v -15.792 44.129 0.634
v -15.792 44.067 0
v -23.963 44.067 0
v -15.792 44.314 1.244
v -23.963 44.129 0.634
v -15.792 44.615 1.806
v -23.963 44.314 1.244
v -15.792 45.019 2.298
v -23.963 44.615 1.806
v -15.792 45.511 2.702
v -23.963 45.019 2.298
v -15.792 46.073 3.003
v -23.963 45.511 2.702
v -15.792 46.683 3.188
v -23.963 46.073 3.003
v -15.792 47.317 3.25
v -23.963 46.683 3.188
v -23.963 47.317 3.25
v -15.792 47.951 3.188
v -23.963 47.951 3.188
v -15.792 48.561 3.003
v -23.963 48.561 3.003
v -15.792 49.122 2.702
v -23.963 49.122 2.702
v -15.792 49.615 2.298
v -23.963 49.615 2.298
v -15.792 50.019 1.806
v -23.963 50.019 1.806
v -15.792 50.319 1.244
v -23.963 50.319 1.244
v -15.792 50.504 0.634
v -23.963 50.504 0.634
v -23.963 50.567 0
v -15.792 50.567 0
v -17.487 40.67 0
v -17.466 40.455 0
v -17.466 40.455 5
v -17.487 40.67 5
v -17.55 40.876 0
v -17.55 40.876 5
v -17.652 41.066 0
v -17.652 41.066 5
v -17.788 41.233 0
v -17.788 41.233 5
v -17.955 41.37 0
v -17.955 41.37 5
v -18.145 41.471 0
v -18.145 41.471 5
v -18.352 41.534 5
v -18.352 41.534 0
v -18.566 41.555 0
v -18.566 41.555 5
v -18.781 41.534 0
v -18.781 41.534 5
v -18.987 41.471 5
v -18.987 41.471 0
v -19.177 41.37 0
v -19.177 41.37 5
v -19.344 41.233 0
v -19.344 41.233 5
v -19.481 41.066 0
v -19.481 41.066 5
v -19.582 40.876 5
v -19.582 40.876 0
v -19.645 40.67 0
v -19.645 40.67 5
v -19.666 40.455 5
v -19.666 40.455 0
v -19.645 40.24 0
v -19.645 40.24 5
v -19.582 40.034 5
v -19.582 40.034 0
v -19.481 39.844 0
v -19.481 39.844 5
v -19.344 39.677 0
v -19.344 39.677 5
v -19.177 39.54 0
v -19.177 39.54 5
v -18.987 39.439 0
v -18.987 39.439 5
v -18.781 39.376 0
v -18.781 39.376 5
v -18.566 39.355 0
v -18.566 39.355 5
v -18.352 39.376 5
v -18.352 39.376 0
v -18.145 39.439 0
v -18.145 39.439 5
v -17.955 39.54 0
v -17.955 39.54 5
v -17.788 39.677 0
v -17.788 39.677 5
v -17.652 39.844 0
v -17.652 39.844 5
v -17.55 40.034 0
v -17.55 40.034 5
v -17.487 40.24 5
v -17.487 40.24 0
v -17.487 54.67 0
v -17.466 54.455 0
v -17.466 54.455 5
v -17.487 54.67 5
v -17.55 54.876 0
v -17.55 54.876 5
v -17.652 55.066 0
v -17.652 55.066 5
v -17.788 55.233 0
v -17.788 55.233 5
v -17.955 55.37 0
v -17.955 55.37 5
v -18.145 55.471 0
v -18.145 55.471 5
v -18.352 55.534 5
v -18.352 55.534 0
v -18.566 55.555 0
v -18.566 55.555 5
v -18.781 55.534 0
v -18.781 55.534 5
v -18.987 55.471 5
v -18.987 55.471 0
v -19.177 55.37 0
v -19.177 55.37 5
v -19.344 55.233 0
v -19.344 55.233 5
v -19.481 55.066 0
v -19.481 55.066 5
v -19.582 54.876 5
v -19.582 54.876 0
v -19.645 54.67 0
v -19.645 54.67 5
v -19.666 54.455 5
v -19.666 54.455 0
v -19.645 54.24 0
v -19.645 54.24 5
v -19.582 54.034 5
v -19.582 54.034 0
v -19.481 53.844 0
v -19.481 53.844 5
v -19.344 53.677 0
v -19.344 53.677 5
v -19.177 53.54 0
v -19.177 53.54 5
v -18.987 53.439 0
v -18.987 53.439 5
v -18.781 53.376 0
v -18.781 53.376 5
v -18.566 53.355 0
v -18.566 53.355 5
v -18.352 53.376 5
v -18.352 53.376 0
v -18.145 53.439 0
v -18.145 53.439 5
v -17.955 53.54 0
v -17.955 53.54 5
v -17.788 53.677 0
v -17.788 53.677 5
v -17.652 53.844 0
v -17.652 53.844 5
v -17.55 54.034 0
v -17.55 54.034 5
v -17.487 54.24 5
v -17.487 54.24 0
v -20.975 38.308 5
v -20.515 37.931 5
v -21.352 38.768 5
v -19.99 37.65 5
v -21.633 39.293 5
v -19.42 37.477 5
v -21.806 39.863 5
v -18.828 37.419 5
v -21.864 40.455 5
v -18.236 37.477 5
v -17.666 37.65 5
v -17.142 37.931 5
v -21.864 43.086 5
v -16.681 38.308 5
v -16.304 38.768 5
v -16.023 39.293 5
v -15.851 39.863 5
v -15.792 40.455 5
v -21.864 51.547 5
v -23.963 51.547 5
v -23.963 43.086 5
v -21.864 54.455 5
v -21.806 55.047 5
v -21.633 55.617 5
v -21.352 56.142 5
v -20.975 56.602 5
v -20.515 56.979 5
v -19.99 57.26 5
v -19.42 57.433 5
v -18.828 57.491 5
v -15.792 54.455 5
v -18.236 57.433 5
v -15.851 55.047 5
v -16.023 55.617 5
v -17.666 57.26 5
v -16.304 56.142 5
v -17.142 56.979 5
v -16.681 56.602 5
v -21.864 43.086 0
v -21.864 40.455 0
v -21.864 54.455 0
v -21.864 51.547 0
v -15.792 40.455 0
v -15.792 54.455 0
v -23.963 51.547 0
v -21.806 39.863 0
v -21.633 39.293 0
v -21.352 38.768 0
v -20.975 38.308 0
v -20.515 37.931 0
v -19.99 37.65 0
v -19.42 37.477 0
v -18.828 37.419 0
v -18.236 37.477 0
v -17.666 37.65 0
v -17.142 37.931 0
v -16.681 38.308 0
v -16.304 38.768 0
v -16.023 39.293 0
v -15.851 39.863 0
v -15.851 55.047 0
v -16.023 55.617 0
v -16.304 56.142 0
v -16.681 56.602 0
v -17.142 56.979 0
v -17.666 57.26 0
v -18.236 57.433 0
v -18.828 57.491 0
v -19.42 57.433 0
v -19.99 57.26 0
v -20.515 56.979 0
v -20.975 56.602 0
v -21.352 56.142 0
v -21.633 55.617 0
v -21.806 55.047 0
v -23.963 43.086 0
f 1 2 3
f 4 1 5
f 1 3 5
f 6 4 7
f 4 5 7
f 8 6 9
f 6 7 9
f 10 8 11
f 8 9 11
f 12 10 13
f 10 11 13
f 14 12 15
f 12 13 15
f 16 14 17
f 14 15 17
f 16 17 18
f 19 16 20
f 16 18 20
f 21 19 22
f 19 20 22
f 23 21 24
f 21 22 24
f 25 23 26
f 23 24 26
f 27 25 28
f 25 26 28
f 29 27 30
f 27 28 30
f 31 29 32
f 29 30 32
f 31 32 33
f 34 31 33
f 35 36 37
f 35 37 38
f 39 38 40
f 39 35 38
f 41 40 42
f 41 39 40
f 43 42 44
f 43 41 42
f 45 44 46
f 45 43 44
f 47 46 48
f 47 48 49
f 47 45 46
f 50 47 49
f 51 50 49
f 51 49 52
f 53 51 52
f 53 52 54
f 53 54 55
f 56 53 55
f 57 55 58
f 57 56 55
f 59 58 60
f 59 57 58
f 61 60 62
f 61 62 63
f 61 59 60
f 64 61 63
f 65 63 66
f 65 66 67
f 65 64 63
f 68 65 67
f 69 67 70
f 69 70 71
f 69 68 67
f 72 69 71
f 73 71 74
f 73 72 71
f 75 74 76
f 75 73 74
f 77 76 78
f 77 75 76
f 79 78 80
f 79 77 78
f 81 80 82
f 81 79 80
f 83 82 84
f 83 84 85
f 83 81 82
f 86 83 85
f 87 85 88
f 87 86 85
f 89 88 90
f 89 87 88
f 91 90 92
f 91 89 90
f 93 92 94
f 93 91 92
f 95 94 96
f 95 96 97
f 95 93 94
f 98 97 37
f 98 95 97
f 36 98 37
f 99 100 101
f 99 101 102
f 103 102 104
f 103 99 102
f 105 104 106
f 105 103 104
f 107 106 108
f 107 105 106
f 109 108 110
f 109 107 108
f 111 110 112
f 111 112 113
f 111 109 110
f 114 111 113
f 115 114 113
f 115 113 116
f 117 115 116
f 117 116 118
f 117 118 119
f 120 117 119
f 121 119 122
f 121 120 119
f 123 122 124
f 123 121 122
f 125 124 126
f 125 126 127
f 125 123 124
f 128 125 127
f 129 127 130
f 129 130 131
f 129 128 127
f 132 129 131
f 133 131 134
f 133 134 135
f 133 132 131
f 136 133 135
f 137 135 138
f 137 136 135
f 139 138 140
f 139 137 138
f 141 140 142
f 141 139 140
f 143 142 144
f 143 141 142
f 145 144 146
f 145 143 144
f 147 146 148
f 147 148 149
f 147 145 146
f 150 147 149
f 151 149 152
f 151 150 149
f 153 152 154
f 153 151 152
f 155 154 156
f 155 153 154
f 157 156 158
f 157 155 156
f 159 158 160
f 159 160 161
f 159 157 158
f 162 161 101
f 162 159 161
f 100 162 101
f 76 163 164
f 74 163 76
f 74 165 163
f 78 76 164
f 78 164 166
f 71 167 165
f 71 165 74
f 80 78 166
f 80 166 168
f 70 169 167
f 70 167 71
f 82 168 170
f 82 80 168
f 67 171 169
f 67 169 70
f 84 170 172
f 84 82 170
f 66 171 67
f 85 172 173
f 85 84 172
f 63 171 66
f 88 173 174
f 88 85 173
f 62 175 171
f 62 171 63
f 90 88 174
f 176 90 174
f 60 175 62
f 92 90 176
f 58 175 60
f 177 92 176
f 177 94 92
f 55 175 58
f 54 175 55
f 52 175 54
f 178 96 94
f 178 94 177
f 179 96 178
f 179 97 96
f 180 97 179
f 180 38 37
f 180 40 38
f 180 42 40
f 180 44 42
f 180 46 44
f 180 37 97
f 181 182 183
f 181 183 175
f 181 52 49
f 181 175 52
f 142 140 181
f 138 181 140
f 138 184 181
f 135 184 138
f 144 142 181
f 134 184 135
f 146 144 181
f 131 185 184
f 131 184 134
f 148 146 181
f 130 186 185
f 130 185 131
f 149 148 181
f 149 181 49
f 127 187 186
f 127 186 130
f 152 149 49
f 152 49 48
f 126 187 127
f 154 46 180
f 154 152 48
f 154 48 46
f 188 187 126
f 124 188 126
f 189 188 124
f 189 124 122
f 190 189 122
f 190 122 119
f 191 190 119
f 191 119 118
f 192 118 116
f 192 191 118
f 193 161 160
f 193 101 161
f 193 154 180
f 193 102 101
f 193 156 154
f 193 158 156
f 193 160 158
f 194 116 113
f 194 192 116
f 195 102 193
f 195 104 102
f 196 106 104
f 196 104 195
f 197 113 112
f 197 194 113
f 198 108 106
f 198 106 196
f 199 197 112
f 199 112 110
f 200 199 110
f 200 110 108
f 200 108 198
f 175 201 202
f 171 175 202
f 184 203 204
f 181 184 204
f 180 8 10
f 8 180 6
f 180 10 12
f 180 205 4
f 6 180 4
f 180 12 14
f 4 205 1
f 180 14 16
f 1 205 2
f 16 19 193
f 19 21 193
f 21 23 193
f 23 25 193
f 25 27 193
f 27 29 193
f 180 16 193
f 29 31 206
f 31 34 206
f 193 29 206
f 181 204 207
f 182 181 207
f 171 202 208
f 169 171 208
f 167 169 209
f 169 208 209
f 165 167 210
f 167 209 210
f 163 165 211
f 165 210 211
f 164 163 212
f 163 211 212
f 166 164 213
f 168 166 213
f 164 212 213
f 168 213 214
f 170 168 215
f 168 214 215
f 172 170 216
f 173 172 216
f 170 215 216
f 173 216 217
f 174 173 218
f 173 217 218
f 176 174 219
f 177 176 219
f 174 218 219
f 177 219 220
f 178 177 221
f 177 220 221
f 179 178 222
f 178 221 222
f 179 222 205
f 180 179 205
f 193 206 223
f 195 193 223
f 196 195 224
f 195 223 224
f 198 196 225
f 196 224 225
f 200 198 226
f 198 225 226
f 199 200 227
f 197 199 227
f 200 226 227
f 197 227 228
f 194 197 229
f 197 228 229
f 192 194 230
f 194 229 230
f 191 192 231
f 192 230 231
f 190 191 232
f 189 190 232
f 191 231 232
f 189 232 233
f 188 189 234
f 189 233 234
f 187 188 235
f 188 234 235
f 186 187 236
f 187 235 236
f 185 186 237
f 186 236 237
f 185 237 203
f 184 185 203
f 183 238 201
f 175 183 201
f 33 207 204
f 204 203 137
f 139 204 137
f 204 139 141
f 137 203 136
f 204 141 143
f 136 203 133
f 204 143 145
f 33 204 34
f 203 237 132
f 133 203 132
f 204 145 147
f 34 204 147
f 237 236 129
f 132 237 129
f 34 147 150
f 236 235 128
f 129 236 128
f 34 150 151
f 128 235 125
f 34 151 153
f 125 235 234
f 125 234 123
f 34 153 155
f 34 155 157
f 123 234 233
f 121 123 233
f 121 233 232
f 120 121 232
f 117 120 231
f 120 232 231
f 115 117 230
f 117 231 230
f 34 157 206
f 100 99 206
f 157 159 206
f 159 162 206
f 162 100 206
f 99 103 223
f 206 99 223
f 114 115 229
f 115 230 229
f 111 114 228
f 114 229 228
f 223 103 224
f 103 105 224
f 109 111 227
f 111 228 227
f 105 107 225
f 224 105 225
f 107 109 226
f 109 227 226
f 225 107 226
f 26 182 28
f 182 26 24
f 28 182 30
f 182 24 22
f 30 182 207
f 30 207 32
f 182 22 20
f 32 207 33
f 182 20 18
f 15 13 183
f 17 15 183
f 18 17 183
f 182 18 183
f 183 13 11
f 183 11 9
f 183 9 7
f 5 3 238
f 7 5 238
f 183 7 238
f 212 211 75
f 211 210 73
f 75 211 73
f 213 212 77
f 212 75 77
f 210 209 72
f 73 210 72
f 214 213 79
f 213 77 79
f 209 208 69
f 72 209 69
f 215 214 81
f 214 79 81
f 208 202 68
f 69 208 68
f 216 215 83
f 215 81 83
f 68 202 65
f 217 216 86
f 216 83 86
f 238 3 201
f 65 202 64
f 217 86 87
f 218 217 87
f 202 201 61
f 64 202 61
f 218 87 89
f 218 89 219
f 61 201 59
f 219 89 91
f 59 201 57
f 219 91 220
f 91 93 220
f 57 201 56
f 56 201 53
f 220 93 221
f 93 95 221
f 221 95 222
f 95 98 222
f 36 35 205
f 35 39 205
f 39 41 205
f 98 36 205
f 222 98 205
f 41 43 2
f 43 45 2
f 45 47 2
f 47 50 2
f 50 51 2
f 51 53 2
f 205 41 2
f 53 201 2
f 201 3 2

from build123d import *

# Parameters (mm, degrees)
ESQUISSE1_R             = 1.1
EXTRUSION1_DEPTH        = 5
ESQUISSE2_R             = 3.25
ENL_V_MAT_EXTRU_1_DEPTH = 59.283442679


with BuildPart() as part:
    # Esquisse1 → Extrusion1 (new body)
    with BuildSketch(Plane.XY):
        with BuildLine():
            Line((-15.792310365, 40.455003044), (-15.792310365, 54.455003044))
            ThreePointArc((-15.792310365, 54.455003044), (-18.828177284, 57.490869963), (-21.864044203, 54.455003044))
            Line((-21.864044203, 54.455003044), (-21.864044203, 51.547447727))
            Line((-21.864044203, 51.547447727), (-23.962962816, 51.547447727))
            Line((-23.962962816, 51.547447727), (-23.962962816, 43.086270123))
            Line((-23.962962816, 43.086270123), (-21.864044203, 43.086270123))
            Line((-21.864044203, 43.086270123), (-21.864044203, 40.455003044))
            ThreePointArc((-21.864044203, 40.455003044), (-18.828177284, 37.419136124), (-15.792310365, 40.455003044))
        make_face()
        with Locations((-18.566221644, 40.455003043)):
            Circle(ESQUISSE1_R, mode=Mode.SUBTRACT)
        with Locations((-18.566221644, 54.455003043)):
            Circle(ESQUISSE1_R, mode=Mode.SUBTRACT)
    extrude(amount=EXTRUSION1_DEPTH)

    # Esquisse2 → Enlèv. mat.-Extru.1 (cut, through all)
    with BuildSketch(Plane.ZY.offset(23.962962816)):
        with Locations((0, 47.316858925)):
            Circle(ESQUISSE2_R)
    extrude(amount=-ENL_V_MAT_EXTRU_1_DEPTH, mode=Mode.SUBTRACT)


solid = part.part
